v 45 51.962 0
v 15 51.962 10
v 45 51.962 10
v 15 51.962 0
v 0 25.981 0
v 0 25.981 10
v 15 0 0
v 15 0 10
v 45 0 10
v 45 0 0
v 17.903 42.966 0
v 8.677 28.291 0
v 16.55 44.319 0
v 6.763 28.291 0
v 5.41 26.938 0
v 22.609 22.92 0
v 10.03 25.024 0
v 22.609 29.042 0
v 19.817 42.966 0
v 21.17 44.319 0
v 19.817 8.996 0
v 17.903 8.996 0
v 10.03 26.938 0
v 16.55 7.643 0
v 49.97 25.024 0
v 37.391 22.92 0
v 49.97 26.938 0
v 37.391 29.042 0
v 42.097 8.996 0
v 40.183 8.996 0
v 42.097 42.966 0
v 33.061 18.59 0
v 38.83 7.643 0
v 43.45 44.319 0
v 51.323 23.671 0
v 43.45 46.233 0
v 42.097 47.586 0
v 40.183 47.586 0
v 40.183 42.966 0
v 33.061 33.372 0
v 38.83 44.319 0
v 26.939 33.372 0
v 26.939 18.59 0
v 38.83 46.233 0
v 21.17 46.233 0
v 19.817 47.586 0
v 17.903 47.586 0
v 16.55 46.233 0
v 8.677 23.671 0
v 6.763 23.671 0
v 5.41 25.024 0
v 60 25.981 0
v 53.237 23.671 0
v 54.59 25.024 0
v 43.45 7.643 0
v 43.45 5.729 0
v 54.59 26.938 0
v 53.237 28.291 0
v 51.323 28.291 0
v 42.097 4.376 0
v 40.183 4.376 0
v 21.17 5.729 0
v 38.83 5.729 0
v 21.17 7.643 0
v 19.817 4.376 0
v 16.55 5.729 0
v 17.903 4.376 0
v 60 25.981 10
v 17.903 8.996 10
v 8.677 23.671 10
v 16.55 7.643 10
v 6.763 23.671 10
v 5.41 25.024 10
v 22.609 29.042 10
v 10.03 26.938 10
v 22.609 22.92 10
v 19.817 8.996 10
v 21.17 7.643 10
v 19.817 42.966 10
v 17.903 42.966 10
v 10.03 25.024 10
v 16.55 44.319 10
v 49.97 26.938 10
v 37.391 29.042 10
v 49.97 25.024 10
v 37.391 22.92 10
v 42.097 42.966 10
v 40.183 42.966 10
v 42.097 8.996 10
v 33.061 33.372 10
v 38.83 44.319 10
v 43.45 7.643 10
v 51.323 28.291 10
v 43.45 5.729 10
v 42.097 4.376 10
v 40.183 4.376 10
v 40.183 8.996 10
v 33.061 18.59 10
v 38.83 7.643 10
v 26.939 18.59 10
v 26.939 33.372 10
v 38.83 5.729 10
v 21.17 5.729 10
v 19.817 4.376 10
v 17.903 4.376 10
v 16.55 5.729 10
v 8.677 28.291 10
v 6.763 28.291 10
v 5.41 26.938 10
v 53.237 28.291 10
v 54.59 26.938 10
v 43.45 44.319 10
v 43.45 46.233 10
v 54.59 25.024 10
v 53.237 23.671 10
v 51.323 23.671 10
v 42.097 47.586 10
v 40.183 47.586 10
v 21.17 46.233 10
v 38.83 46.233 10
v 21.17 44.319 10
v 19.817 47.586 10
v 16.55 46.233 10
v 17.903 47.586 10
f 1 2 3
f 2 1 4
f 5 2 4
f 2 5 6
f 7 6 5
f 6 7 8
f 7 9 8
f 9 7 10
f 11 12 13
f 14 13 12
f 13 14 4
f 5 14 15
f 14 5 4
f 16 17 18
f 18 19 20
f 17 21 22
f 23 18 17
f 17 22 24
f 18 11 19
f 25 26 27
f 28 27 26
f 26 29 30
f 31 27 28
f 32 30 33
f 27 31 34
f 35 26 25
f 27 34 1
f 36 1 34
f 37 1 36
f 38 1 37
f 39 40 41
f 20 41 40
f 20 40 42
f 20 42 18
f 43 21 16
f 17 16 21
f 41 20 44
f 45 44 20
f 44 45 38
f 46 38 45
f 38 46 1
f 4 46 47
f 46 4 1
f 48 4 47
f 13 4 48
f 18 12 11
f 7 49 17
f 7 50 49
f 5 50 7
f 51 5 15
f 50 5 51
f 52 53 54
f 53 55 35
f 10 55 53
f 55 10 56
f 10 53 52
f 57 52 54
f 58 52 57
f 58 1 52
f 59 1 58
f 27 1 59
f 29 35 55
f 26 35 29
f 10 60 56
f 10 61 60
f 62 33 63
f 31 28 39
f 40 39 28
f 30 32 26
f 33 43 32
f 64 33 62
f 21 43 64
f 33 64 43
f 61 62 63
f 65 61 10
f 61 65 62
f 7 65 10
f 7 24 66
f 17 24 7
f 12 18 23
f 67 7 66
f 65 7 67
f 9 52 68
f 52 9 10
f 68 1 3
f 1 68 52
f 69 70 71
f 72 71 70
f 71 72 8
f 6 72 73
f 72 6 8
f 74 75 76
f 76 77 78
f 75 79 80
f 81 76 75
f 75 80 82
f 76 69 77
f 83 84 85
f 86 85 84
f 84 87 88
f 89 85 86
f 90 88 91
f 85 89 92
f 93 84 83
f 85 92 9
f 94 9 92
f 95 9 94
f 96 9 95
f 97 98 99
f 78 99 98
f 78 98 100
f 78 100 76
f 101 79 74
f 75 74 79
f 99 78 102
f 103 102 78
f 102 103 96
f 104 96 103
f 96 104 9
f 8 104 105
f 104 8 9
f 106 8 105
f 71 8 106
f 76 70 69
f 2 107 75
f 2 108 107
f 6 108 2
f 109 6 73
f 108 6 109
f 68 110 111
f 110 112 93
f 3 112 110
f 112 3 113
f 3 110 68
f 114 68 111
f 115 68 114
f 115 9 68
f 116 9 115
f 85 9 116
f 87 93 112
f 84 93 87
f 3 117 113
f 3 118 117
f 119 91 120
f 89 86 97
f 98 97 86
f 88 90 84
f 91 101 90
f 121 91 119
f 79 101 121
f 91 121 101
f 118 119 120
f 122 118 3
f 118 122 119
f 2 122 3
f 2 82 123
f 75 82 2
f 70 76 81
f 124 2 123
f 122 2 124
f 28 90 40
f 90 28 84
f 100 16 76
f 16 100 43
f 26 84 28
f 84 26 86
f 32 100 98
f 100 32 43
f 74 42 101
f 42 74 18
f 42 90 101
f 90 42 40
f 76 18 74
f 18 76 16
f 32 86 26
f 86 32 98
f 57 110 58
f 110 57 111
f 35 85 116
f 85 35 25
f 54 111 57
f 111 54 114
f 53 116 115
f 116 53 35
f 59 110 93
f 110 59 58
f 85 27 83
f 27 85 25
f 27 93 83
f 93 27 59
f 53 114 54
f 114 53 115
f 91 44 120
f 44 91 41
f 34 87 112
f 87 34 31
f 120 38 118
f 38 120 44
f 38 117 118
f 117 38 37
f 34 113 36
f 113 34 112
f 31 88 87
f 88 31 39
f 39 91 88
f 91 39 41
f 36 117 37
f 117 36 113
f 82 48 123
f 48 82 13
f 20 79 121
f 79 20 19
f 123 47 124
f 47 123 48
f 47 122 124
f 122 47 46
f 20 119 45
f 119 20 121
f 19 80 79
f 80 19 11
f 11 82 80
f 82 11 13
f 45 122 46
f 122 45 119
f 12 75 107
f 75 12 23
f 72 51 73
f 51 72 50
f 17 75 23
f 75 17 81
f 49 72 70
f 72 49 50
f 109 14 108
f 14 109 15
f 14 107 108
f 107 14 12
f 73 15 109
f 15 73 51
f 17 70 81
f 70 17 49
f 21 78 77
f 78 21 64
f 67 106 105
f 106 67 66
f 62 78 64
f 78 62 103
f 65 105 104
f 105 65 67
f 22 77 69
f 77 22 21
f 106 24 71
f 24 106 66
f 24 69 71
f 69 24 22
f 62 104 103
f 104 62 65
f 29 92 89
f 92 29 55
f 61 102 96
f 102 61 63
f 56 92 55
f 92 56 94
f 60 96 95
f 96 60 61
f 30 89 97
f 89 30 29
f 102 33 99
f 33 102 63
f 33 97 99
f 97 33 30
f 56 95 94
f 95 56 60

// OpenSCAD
$fn = 32;

// ----------------------------------------------------------------------
// Polygon plate: 6-gon R30, 6 bolt windows
// ----------------------------------------------------------------------

// --- parameters (mm) ---
sides = 6;                // number of polygon sides
plate_r = 30;             // circumscribed radius of the polygon
bore_r = 8;               // centre bore radius
bolts = 6;                // number of bolt windows
ring_r = 22.28;           // bolt-circle radius
bolt_r = 2.5;             // bolt window radius
plate_t = 10;             // plate thickness, Z (extrusion height)

plate_d = 2 * plate_r;  // circumscribed diameter
bore_d = 2 * bore_r;  // centre bore diameter
bolt_d = 2 * bolt_r;  // bolt window diameter
ring_d = 2 * ring_r;  // bolt-circle diameter

profile = [[60, 25.981], [45, 51.962], [15, 51.962], [0, 25.981], [15, 0], [45, 0]];  // primary outline, 6 points, counter clockwise
void_1 = [[37.391, 29.042], [33.061, 33.372], [26.939, 33.372], [22.609, 29.042], [22.609, 22.92], [26.939, 18.59], [33.061, 18.59], [37.391, 22.92]];  // centre bore, 8 points
void_2 = [[54.59, 26.938], [53.237, 28.291], [51.323, 28.291], [49.97, 26.938], [49.97, 25.024], [51.323, 23.671], [53.237, 23.671], [54.59, 25.024]];  // bolt window 1, 8 points
void_3 = [[43.45, 46.233], [42.097, 47.586], [40.183, 47.586], [38.83, 46.233], [38.83, 44.319], [40.183, 42.966], [42.097, 42.966], [43.45, 44.319]];  // bolt window 2, 8 points
void_4 = [[21.17, 46.233], [19.817, 47.586], [17.903, 47.586], [16.55, 46.233], [16.55, 44.319], [17.903, 42.966], [19.817, 42.966], [21.17, 44.319]];  // bolt window 3, 8 points
void_5 = [[10.03, 26.938], [8.677, 28.291], [6.763, 28.291], [5.41, 26.938], [5.41, 25.024], [6.763, 23.671], [8.677, 23.671], [10.03, 25.024]];  // bolt window 4, 8 points
void_6 = [[21.17, 7.643], [19.817, 8.996], [17.903, 8.996], [16.55, 7.643], [16.55, 5.729], [17.903, 4.376], [19.817, 4.376], [21.17, 5.729]];  // bolt window 5, 8 points
void_7 = [[43.45, 7.643], [42.097, 8.996], [40.183, 8.996], [38.83, 7.643], [38.83, 5.729], [40.183, 4.376], [42.097, 4.376], [43.45, 5.729]];  // bolt window 6, 8 points

// --- the one profile operation ---
difference() {
  linear_extrude(height = plate_t) polygon(points = profile);
  translate([0, 0, -1])
    linear_extrude(height = plate_t + 2) polygon(points = void_1);
  translate([0, 0, -1])
    linear_extrude(height = plate_t + 2) polygon(points = void_2);
  translate([0, 0, -1])
    linear_extrude(height = plate_t + 2) polygon(points = void_3);
  translate([0, 0, -1])
    linear_extrude(height = plate_t + 2) polygon(points = void_4);
  translate([0, 0, -1])
    linear_extrude(height = plate_t + 2) polygon(points = void_5);
  translate([0, 0, -1])
    linear_extrude(height = plate_t + 2) polygon(points = void_6);
  translate([0, 0, -1])
    linear_extrude(height = plate_t + 2) polygon(points = void_7);
}
